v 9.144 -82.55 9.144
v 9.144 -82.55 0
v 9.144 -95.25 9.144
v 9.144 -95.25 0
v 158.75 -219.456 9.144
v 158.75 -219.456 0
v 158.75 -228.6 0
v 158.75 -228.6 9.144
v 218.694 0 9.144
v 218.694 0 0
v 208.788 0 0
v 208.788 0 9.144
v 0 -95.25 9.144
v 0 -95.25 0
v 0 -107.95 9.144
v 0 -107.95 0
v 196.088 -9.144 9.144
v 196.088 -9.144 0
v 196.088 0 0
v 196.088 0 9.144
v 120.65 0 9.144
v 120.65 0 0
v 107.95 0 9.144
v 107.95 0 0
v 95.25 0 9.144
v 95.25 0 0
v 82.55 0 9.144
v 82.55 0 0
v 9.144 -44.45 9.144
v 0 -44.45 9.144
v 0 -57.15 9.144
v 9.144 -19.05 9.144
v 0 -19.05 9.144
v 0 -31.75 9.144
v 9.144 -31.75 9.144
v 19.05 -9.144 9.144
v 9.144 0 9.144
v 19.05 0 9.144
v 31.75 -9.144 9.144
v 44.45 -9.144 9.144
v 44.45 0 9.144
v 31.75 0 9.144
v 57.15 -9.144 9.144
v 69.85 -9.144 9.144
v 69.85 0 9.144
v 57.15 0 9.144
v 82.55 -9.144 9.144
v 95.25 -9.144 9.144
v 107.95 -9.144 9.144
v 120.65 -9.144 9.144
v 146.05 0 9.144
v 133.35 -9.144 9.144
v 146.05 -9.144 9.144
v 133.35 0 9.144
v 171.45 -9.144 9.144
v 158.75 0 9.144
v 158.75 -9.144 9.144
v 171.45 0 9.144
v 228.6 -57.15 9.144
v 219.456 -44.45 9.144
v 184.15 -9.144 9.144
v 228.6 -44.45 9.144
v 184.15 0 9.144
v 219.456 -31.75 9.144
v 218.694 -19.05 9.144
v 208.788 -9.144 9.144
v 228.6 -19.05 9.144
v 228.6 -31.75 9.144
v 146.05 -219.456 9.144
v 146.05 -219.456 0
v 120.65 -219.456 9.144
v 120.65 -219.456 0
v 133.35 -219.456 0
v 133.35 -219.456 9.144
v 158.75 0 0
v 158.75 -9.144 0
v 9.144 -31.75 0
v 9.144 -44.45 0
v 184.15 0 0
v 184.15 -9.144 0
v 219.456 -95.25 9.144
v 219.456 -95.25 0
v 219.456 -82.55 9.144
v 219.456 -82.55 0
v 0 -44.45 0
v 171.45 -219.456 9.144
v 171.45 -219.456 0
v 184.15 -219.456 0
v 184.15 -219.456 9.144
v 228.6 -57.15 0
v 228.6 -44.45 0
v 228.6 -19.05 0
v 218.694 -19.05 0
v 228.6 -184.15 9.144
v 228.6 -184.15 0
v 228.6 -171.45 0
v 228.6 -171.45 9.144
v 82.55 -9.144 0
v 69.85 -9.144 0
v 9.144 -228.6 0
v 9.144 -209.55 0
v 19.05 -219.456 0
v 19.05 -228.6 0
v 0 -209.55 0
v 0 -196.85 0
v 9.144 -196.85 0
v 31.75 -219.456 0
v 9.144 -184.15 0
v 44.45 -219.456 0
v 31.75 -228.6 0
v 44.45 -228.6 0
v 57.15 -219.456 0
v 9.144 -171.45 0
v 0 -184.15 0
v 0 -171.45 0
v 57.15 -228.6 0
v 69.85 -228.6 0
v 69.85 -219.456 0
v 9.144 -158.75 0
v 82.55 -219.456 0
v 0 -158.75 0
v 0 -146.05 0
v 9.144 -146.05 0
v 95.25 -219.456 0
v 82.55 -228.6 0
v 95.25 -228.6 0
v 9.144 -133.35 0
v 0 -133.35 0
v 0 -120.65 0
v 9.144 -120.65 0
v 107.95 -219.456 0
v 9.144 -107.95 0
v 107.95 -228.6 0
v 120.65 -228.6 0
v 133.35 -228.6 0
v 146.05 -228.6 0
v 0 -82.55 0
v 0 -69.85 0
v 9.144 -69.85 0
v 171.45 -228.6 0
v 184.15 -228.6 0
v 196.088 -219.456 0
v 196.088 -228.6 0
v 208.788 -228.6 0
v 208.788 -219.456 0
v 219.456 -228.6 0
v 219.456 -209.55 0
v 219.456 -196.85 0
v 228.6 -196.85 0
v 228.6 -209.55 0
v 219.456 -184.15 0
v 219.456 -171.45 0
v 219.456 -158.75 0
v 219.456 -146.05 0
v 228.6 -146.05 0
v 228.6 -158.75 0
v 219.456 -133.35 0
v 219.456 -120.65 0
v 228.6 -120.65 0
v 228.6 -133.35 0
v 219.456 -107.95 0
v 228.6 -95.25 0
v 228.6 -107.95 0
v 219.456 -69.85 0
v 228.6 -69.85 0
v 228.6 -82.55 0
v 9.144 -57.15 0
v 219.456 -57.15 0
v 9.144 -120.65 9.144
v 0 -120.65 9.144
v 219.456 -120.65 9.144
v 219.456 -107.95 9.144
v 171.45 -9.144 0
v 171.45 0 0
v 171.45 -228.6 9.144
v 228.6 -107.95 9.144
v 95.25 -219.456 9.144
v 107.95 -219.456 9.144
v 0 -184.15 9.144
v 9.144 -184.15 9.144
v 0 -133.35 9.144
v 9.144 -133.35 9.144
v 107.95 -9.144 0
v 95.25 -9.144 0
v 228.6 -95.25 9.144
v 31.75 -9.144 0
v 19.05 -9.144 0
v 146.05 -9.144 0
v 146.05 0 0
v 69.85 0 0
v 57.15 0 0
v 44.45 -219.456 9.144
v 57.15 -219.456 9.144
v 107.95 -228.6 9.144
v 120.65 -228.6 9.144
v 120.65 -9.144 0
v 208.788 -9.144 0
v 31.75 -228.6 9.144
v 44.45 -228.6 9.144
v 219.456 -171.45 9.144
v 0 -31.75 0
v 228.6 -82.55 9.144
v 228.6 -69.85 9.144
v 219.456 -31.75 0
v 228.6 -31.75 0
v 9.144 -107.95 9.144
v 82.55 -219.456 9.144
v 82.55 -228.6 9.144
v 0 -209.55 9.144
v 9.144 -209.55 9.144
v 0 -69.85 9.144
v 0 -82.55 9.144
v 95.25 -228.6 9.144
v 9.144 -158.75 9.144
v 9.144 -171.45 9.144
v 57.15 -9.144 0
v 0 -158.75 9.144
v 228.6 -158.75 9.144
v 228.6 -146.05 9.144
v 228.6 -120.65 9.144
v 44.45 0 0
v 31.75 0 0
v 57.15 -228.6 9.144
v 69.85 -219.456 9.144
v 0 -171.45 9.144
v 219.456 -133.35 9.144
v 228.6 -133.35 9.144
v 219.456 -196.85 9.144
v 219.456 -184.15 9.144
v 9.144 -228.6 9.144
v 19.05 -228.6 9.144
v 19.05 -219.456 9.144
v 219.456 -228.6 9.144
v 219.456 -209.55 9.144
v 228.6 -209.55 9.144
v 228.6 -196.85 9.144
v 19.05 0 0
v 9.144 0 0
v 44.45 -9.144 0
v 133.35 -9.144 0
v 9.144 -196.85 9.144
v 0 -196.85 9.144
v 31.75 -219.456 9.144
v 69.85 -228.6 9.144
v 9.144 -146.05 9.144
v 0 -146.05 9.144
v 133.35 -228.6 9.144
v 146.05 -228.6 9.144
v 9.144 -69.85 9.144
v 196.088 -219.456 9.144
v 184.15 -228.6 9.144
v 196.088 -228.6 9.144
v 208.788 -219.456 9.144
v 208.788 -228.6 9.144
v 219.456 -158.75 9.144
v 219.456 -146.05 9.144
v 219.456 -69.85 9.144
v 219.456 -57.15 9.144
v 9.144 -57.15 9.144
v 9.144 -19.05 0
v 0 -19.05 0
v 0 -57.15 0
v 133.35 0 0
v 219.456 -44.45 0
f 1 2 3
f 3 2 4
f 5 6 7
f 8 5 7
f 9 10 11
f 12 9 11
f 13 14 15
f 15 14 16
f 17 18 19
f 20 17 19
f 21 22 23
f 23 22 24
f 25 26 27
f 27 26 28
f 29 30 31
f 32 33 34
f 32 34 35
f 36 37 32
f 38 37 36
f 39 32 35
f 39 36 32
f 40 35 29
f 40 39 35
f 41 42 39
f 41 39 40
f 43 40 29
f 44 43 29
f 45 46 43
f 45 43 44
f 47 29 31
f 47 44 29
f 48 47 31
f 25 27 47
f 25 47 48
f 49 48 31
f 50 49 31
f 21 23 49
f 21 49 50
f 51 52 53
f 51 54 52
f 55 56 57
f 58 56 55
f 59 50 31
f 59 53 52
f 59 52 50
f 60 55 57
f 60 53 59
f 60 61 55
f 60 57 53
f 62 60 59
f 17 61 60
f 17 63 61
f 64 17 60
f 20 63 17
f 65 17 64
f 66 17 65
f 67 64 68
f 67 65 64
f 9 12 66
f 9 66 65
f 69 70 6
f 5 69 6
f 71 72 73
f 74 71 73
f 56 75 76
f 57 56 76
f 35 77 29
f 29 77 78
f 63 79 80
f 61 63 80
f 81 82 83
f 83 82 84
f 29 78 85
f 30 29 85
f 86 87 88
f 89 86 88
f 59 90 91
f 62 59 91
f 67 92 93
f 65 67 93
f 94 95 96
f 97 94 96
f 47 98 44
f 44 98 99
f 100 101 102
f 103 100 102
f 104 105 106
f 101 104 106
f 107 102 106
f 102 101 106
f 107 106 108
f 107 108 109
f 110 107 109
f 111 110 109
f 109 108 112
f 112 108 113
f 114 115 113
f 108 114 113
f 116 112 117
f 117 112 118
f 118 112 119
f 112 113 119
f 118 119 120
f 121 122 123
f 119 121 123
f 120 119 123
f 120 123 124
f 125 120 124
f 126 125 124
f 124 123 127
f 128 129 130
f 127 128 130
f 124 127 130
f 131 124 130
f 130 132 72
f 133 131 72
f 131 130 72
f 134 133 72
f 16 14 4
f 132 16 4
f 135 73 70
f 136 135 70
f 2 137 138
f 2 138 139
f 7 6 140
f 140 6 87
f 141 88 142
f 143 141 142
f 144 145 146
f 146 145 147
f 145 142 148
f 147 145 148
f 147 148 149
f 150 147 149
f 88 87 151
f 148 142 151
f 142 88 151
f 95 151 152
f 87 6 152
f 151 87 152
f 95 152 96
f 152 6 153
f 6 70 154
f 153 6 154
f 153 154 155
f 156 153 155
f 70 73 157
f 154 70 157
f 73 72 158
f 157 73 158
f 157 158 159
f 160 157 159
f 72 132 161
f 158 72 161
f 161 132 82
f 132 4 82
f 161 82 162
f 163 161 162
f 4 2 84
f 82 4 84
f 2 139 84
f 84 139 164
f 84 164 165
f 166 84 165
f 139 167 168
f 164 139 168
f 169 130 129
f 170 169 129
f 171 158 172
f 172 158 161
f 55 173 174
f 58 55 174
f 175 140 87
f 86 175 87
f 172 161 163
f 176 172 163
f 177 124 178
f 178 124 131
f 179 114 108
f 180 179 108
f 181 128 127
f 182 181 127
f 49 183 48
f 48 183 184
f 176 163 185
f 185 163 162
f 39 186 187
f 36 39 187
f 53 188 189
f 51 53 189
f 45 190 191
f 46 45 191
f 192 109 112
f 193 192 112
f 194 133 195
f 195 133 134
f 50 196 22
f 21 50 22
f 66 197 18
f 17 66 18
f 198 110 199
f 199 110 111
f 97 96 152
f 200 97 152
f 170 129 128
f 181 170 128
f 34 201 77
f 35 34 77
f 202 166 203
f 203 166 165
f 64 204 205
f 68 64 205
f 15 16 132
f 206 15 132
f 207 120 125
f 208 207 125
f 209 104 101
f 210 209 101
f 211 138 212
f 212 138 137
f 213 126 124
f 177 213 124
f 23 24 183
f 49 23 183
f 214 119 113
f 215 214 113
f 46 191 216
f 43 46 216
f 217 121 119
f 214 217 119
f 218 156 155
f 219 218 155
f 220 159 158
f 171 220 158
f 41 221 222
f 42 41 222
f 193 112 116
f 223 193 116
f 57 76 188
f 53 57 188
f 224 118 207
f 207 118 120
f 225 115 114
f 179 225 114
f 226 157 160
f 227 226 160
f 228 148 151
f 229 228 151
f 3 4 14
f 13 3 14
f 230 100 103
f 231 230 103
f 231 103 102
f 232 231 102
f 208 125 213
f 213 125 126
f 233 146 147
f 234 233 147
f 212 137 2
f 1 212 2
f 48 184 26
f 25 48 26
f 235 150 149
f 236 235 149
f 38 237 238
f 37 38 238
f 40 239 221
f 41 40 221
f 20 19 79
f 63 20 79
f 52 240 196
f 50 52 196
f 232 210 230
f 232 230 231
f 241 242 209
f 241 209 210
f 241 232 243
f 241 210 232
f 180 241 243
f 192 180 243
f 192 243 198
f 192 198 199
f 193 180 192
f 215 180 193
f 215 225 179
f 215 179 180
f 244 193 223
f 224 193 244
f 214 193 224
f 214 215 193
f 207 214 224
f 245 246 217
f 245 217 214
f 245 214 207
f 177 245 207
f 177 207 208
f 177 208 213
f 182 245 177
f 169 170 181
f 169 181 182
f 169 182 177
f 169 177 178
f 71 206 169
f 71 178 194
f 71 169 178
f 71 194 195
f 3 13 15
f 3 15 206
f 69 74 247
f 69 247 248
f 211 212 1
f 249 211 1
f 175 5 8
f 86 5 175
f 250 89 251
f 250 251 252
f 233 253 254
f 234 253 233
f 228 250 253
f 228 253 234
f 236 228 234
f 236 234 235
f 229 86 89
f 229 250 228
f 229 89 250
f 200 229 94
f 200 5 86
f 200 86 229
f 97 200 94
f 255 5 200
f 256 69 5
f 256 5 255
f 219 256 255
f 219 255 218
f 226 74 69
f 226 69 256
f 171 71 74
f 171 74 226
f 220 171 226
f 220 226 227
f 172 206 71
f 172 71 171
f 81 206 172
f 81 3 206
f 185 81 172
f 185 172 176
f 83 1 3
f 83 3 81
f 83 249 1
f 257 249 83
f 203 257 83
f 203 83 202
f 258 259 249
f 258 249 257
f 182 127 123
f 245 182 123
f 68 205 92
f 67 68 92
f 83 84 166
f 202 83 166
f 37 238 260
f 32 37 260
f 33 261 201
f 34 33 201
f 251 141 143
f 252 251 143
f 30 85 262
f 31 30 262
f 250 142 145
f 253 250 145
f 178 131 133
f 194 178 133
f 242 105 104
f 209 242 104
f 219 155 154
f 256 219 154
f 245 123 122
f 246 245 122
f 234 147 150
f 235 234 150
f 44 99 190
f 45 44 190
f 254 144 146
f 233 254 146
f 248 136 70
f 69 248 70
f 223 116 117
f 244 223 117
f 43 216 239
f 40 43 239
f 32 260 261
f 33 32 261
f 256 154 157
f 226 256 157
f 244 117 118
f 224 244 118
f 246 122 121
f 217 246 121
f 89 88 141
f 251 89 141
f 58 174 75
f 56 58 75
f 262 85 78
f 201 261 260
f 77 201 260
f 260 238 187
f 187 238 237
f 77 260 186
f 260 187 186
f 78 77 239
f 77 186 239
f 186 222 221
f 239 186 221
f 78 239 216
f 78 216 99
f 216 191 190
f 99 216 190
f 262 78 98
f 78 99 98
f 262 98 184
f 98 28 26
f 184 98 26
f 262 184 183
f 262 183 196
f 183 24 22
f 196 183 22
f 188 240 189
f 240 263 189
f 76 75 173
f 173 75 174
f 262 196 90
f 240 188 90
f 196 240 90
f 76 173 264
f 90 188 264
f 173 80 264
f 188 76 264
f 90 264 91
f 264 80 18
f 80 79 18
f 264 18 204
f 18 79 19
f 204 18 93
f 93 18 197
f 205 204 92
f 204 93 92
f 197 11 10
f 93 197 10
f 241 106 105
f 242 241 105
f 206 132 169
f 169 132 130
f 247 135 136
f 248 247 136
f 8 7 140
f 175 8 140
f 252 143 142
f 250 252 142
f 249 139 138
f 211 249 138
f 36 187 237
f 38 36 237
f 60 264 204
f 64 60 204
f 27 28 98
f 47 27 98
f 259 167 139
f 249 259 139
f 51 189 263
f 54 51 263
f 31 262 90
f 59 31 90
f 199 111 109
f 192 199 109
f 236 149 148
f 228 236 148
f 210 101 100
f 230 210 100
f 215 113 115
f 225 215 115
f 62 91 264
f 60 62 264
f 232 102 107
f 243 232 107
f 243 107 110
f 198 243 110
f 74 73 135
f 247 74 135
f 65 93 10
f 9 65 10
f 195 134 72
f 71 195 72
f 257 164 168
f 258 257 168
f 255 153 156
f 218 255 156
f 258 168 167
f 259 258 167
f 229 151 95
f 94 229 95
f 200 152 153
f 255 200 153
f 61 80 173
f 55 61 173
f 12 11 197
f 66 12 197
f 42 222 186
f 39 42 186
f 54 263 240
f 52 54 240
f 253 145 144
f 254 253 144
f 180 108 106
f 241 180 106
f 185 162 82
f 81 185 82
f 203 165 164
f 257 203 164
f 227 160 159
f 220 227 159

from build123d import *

# Parameters (mm, degrees)
F1_DEPTH = 9.144
F2_DEPTH = 9.144


with BuildPart() as f1:
    # F0 (on Top) → F1 (new body)
    with BuildSketch(Plane.XY):
        Polygon((19.05, 0), (9.144, 0), (9.144, -19.05), (0, -19.05), (0, -31.75), (9.144, -31.75), (9.144, -44.45), (0, -44.45), (0, -57.15), (9.144, -57.15), (219.456, -57.15), (228.6, -57.15), (228.6, -44.45), (219.456, -44.45), (219.456, -31.75), (228.6, -31.75), (228.6, -19.05), (218.694, -19.05), (218.694, 0), (208.788, 0), (208.788, -9.144), (196.088, -9.144), (196.088, 0), (184.15, 0), (184.15, -9.144), (171.45, -9.144), (171.45, 0), (158.75, 0), (158.75, -9.144), (146.05, -9.144), (146.05, 0), (133.35, 0), (133.35, -9.144), (120.65, -9.144), (120.65, 0), (107.95, 0), (107.95, -9.144), (95.25, -9.144), (95.25, 0), (82.55, 0), (82.55, -9.144), (69.85, -9.144), (69.85, 0), (57.15, 0), (57.15, -9.144), (44.45, -9.144), (44.45, 0), (31.75, 0), (31.75, -9.144), (19.05, -9.144), align=None)
    extrude(amount=F1_DEPTH)


with BuildPart() as f2:
    # F0 (on Top) → F2 (new body)
    with BuildSketch(Plane.XY):
        Polygon((219.456, -57.15), (9.144, -57.15), (9.144, -69.85), (0, -69.85), (0, -82.55), (9.144, -82.55), (9.144, -95.25), (0, -95.25), (0, -107.95), (9.144, -107.95), (9.144, -120.65), (0, -120.65), (0, -133.35), (9.144, -133.35), (9.144, -146.05), (0, -146.05), (0, -158.75), (9.144, -158.75), (9.144, -171.45), (0, -171.45), (0, -184.15), (9.144, -184.15), (9.144, -196.85), (0, -196.85), (0, -209.55), (9.144, -209.55), (9.144, -228.6), (19.05, -228.6), (19.05, -219.456), (31.75, -219.456), (31.75, -228.6), (44.45, -228.6), (44.45, -219.456), (57.15, -219.456), (57.15, -228.6), (69.85, -228.6), (69.85, -219.456), (82.55, -219.456), (82.55, -228.6), (95.25, -228.6), (95.25, -219.456), (107.95, -219.456), (107.95, -228.6), (120.65, -228.6), (120.65, -219.456), (133.35, -219.456), (133.35, -228.6), (146.05, -228.6), (146.05, -219.456), (158.75, -219.456), (158.75, -228.6), (171.45, -228.6), (171.45, -219.456), (184.15, -219.456), (184.15, -228.6), (196.088, -228.6), (196.088, -219.456), (208.788, -219.456), (208.788, -228.6), (219.456, -228.6), (219.456, -209.55), (228.6, -209.55), (228.6, -196.85), (219.456, -196.85), (219.456, -184.15), (228.6, -184.15), (228.6, -171.45), (219.456, -171.45), (219.456, -158.75), (228.6, -158.75), (228.6, -146.05), (219.456, -146.05), (219.456, -133.35), (228.6, -133.35), (228.6, -120.65), (219.456, -120.65), (219.456, -107.95), (228.6, -107.95), (228.6, -95.25), (219.456, -95.25), (219.456, -82.55), (228.6, -82.55), (228.6, -69.85), (219.456, -69.85), align=None)
    extrude(amount=F2_DEPTH)


solid = Compound([f1.part, f2.part])
